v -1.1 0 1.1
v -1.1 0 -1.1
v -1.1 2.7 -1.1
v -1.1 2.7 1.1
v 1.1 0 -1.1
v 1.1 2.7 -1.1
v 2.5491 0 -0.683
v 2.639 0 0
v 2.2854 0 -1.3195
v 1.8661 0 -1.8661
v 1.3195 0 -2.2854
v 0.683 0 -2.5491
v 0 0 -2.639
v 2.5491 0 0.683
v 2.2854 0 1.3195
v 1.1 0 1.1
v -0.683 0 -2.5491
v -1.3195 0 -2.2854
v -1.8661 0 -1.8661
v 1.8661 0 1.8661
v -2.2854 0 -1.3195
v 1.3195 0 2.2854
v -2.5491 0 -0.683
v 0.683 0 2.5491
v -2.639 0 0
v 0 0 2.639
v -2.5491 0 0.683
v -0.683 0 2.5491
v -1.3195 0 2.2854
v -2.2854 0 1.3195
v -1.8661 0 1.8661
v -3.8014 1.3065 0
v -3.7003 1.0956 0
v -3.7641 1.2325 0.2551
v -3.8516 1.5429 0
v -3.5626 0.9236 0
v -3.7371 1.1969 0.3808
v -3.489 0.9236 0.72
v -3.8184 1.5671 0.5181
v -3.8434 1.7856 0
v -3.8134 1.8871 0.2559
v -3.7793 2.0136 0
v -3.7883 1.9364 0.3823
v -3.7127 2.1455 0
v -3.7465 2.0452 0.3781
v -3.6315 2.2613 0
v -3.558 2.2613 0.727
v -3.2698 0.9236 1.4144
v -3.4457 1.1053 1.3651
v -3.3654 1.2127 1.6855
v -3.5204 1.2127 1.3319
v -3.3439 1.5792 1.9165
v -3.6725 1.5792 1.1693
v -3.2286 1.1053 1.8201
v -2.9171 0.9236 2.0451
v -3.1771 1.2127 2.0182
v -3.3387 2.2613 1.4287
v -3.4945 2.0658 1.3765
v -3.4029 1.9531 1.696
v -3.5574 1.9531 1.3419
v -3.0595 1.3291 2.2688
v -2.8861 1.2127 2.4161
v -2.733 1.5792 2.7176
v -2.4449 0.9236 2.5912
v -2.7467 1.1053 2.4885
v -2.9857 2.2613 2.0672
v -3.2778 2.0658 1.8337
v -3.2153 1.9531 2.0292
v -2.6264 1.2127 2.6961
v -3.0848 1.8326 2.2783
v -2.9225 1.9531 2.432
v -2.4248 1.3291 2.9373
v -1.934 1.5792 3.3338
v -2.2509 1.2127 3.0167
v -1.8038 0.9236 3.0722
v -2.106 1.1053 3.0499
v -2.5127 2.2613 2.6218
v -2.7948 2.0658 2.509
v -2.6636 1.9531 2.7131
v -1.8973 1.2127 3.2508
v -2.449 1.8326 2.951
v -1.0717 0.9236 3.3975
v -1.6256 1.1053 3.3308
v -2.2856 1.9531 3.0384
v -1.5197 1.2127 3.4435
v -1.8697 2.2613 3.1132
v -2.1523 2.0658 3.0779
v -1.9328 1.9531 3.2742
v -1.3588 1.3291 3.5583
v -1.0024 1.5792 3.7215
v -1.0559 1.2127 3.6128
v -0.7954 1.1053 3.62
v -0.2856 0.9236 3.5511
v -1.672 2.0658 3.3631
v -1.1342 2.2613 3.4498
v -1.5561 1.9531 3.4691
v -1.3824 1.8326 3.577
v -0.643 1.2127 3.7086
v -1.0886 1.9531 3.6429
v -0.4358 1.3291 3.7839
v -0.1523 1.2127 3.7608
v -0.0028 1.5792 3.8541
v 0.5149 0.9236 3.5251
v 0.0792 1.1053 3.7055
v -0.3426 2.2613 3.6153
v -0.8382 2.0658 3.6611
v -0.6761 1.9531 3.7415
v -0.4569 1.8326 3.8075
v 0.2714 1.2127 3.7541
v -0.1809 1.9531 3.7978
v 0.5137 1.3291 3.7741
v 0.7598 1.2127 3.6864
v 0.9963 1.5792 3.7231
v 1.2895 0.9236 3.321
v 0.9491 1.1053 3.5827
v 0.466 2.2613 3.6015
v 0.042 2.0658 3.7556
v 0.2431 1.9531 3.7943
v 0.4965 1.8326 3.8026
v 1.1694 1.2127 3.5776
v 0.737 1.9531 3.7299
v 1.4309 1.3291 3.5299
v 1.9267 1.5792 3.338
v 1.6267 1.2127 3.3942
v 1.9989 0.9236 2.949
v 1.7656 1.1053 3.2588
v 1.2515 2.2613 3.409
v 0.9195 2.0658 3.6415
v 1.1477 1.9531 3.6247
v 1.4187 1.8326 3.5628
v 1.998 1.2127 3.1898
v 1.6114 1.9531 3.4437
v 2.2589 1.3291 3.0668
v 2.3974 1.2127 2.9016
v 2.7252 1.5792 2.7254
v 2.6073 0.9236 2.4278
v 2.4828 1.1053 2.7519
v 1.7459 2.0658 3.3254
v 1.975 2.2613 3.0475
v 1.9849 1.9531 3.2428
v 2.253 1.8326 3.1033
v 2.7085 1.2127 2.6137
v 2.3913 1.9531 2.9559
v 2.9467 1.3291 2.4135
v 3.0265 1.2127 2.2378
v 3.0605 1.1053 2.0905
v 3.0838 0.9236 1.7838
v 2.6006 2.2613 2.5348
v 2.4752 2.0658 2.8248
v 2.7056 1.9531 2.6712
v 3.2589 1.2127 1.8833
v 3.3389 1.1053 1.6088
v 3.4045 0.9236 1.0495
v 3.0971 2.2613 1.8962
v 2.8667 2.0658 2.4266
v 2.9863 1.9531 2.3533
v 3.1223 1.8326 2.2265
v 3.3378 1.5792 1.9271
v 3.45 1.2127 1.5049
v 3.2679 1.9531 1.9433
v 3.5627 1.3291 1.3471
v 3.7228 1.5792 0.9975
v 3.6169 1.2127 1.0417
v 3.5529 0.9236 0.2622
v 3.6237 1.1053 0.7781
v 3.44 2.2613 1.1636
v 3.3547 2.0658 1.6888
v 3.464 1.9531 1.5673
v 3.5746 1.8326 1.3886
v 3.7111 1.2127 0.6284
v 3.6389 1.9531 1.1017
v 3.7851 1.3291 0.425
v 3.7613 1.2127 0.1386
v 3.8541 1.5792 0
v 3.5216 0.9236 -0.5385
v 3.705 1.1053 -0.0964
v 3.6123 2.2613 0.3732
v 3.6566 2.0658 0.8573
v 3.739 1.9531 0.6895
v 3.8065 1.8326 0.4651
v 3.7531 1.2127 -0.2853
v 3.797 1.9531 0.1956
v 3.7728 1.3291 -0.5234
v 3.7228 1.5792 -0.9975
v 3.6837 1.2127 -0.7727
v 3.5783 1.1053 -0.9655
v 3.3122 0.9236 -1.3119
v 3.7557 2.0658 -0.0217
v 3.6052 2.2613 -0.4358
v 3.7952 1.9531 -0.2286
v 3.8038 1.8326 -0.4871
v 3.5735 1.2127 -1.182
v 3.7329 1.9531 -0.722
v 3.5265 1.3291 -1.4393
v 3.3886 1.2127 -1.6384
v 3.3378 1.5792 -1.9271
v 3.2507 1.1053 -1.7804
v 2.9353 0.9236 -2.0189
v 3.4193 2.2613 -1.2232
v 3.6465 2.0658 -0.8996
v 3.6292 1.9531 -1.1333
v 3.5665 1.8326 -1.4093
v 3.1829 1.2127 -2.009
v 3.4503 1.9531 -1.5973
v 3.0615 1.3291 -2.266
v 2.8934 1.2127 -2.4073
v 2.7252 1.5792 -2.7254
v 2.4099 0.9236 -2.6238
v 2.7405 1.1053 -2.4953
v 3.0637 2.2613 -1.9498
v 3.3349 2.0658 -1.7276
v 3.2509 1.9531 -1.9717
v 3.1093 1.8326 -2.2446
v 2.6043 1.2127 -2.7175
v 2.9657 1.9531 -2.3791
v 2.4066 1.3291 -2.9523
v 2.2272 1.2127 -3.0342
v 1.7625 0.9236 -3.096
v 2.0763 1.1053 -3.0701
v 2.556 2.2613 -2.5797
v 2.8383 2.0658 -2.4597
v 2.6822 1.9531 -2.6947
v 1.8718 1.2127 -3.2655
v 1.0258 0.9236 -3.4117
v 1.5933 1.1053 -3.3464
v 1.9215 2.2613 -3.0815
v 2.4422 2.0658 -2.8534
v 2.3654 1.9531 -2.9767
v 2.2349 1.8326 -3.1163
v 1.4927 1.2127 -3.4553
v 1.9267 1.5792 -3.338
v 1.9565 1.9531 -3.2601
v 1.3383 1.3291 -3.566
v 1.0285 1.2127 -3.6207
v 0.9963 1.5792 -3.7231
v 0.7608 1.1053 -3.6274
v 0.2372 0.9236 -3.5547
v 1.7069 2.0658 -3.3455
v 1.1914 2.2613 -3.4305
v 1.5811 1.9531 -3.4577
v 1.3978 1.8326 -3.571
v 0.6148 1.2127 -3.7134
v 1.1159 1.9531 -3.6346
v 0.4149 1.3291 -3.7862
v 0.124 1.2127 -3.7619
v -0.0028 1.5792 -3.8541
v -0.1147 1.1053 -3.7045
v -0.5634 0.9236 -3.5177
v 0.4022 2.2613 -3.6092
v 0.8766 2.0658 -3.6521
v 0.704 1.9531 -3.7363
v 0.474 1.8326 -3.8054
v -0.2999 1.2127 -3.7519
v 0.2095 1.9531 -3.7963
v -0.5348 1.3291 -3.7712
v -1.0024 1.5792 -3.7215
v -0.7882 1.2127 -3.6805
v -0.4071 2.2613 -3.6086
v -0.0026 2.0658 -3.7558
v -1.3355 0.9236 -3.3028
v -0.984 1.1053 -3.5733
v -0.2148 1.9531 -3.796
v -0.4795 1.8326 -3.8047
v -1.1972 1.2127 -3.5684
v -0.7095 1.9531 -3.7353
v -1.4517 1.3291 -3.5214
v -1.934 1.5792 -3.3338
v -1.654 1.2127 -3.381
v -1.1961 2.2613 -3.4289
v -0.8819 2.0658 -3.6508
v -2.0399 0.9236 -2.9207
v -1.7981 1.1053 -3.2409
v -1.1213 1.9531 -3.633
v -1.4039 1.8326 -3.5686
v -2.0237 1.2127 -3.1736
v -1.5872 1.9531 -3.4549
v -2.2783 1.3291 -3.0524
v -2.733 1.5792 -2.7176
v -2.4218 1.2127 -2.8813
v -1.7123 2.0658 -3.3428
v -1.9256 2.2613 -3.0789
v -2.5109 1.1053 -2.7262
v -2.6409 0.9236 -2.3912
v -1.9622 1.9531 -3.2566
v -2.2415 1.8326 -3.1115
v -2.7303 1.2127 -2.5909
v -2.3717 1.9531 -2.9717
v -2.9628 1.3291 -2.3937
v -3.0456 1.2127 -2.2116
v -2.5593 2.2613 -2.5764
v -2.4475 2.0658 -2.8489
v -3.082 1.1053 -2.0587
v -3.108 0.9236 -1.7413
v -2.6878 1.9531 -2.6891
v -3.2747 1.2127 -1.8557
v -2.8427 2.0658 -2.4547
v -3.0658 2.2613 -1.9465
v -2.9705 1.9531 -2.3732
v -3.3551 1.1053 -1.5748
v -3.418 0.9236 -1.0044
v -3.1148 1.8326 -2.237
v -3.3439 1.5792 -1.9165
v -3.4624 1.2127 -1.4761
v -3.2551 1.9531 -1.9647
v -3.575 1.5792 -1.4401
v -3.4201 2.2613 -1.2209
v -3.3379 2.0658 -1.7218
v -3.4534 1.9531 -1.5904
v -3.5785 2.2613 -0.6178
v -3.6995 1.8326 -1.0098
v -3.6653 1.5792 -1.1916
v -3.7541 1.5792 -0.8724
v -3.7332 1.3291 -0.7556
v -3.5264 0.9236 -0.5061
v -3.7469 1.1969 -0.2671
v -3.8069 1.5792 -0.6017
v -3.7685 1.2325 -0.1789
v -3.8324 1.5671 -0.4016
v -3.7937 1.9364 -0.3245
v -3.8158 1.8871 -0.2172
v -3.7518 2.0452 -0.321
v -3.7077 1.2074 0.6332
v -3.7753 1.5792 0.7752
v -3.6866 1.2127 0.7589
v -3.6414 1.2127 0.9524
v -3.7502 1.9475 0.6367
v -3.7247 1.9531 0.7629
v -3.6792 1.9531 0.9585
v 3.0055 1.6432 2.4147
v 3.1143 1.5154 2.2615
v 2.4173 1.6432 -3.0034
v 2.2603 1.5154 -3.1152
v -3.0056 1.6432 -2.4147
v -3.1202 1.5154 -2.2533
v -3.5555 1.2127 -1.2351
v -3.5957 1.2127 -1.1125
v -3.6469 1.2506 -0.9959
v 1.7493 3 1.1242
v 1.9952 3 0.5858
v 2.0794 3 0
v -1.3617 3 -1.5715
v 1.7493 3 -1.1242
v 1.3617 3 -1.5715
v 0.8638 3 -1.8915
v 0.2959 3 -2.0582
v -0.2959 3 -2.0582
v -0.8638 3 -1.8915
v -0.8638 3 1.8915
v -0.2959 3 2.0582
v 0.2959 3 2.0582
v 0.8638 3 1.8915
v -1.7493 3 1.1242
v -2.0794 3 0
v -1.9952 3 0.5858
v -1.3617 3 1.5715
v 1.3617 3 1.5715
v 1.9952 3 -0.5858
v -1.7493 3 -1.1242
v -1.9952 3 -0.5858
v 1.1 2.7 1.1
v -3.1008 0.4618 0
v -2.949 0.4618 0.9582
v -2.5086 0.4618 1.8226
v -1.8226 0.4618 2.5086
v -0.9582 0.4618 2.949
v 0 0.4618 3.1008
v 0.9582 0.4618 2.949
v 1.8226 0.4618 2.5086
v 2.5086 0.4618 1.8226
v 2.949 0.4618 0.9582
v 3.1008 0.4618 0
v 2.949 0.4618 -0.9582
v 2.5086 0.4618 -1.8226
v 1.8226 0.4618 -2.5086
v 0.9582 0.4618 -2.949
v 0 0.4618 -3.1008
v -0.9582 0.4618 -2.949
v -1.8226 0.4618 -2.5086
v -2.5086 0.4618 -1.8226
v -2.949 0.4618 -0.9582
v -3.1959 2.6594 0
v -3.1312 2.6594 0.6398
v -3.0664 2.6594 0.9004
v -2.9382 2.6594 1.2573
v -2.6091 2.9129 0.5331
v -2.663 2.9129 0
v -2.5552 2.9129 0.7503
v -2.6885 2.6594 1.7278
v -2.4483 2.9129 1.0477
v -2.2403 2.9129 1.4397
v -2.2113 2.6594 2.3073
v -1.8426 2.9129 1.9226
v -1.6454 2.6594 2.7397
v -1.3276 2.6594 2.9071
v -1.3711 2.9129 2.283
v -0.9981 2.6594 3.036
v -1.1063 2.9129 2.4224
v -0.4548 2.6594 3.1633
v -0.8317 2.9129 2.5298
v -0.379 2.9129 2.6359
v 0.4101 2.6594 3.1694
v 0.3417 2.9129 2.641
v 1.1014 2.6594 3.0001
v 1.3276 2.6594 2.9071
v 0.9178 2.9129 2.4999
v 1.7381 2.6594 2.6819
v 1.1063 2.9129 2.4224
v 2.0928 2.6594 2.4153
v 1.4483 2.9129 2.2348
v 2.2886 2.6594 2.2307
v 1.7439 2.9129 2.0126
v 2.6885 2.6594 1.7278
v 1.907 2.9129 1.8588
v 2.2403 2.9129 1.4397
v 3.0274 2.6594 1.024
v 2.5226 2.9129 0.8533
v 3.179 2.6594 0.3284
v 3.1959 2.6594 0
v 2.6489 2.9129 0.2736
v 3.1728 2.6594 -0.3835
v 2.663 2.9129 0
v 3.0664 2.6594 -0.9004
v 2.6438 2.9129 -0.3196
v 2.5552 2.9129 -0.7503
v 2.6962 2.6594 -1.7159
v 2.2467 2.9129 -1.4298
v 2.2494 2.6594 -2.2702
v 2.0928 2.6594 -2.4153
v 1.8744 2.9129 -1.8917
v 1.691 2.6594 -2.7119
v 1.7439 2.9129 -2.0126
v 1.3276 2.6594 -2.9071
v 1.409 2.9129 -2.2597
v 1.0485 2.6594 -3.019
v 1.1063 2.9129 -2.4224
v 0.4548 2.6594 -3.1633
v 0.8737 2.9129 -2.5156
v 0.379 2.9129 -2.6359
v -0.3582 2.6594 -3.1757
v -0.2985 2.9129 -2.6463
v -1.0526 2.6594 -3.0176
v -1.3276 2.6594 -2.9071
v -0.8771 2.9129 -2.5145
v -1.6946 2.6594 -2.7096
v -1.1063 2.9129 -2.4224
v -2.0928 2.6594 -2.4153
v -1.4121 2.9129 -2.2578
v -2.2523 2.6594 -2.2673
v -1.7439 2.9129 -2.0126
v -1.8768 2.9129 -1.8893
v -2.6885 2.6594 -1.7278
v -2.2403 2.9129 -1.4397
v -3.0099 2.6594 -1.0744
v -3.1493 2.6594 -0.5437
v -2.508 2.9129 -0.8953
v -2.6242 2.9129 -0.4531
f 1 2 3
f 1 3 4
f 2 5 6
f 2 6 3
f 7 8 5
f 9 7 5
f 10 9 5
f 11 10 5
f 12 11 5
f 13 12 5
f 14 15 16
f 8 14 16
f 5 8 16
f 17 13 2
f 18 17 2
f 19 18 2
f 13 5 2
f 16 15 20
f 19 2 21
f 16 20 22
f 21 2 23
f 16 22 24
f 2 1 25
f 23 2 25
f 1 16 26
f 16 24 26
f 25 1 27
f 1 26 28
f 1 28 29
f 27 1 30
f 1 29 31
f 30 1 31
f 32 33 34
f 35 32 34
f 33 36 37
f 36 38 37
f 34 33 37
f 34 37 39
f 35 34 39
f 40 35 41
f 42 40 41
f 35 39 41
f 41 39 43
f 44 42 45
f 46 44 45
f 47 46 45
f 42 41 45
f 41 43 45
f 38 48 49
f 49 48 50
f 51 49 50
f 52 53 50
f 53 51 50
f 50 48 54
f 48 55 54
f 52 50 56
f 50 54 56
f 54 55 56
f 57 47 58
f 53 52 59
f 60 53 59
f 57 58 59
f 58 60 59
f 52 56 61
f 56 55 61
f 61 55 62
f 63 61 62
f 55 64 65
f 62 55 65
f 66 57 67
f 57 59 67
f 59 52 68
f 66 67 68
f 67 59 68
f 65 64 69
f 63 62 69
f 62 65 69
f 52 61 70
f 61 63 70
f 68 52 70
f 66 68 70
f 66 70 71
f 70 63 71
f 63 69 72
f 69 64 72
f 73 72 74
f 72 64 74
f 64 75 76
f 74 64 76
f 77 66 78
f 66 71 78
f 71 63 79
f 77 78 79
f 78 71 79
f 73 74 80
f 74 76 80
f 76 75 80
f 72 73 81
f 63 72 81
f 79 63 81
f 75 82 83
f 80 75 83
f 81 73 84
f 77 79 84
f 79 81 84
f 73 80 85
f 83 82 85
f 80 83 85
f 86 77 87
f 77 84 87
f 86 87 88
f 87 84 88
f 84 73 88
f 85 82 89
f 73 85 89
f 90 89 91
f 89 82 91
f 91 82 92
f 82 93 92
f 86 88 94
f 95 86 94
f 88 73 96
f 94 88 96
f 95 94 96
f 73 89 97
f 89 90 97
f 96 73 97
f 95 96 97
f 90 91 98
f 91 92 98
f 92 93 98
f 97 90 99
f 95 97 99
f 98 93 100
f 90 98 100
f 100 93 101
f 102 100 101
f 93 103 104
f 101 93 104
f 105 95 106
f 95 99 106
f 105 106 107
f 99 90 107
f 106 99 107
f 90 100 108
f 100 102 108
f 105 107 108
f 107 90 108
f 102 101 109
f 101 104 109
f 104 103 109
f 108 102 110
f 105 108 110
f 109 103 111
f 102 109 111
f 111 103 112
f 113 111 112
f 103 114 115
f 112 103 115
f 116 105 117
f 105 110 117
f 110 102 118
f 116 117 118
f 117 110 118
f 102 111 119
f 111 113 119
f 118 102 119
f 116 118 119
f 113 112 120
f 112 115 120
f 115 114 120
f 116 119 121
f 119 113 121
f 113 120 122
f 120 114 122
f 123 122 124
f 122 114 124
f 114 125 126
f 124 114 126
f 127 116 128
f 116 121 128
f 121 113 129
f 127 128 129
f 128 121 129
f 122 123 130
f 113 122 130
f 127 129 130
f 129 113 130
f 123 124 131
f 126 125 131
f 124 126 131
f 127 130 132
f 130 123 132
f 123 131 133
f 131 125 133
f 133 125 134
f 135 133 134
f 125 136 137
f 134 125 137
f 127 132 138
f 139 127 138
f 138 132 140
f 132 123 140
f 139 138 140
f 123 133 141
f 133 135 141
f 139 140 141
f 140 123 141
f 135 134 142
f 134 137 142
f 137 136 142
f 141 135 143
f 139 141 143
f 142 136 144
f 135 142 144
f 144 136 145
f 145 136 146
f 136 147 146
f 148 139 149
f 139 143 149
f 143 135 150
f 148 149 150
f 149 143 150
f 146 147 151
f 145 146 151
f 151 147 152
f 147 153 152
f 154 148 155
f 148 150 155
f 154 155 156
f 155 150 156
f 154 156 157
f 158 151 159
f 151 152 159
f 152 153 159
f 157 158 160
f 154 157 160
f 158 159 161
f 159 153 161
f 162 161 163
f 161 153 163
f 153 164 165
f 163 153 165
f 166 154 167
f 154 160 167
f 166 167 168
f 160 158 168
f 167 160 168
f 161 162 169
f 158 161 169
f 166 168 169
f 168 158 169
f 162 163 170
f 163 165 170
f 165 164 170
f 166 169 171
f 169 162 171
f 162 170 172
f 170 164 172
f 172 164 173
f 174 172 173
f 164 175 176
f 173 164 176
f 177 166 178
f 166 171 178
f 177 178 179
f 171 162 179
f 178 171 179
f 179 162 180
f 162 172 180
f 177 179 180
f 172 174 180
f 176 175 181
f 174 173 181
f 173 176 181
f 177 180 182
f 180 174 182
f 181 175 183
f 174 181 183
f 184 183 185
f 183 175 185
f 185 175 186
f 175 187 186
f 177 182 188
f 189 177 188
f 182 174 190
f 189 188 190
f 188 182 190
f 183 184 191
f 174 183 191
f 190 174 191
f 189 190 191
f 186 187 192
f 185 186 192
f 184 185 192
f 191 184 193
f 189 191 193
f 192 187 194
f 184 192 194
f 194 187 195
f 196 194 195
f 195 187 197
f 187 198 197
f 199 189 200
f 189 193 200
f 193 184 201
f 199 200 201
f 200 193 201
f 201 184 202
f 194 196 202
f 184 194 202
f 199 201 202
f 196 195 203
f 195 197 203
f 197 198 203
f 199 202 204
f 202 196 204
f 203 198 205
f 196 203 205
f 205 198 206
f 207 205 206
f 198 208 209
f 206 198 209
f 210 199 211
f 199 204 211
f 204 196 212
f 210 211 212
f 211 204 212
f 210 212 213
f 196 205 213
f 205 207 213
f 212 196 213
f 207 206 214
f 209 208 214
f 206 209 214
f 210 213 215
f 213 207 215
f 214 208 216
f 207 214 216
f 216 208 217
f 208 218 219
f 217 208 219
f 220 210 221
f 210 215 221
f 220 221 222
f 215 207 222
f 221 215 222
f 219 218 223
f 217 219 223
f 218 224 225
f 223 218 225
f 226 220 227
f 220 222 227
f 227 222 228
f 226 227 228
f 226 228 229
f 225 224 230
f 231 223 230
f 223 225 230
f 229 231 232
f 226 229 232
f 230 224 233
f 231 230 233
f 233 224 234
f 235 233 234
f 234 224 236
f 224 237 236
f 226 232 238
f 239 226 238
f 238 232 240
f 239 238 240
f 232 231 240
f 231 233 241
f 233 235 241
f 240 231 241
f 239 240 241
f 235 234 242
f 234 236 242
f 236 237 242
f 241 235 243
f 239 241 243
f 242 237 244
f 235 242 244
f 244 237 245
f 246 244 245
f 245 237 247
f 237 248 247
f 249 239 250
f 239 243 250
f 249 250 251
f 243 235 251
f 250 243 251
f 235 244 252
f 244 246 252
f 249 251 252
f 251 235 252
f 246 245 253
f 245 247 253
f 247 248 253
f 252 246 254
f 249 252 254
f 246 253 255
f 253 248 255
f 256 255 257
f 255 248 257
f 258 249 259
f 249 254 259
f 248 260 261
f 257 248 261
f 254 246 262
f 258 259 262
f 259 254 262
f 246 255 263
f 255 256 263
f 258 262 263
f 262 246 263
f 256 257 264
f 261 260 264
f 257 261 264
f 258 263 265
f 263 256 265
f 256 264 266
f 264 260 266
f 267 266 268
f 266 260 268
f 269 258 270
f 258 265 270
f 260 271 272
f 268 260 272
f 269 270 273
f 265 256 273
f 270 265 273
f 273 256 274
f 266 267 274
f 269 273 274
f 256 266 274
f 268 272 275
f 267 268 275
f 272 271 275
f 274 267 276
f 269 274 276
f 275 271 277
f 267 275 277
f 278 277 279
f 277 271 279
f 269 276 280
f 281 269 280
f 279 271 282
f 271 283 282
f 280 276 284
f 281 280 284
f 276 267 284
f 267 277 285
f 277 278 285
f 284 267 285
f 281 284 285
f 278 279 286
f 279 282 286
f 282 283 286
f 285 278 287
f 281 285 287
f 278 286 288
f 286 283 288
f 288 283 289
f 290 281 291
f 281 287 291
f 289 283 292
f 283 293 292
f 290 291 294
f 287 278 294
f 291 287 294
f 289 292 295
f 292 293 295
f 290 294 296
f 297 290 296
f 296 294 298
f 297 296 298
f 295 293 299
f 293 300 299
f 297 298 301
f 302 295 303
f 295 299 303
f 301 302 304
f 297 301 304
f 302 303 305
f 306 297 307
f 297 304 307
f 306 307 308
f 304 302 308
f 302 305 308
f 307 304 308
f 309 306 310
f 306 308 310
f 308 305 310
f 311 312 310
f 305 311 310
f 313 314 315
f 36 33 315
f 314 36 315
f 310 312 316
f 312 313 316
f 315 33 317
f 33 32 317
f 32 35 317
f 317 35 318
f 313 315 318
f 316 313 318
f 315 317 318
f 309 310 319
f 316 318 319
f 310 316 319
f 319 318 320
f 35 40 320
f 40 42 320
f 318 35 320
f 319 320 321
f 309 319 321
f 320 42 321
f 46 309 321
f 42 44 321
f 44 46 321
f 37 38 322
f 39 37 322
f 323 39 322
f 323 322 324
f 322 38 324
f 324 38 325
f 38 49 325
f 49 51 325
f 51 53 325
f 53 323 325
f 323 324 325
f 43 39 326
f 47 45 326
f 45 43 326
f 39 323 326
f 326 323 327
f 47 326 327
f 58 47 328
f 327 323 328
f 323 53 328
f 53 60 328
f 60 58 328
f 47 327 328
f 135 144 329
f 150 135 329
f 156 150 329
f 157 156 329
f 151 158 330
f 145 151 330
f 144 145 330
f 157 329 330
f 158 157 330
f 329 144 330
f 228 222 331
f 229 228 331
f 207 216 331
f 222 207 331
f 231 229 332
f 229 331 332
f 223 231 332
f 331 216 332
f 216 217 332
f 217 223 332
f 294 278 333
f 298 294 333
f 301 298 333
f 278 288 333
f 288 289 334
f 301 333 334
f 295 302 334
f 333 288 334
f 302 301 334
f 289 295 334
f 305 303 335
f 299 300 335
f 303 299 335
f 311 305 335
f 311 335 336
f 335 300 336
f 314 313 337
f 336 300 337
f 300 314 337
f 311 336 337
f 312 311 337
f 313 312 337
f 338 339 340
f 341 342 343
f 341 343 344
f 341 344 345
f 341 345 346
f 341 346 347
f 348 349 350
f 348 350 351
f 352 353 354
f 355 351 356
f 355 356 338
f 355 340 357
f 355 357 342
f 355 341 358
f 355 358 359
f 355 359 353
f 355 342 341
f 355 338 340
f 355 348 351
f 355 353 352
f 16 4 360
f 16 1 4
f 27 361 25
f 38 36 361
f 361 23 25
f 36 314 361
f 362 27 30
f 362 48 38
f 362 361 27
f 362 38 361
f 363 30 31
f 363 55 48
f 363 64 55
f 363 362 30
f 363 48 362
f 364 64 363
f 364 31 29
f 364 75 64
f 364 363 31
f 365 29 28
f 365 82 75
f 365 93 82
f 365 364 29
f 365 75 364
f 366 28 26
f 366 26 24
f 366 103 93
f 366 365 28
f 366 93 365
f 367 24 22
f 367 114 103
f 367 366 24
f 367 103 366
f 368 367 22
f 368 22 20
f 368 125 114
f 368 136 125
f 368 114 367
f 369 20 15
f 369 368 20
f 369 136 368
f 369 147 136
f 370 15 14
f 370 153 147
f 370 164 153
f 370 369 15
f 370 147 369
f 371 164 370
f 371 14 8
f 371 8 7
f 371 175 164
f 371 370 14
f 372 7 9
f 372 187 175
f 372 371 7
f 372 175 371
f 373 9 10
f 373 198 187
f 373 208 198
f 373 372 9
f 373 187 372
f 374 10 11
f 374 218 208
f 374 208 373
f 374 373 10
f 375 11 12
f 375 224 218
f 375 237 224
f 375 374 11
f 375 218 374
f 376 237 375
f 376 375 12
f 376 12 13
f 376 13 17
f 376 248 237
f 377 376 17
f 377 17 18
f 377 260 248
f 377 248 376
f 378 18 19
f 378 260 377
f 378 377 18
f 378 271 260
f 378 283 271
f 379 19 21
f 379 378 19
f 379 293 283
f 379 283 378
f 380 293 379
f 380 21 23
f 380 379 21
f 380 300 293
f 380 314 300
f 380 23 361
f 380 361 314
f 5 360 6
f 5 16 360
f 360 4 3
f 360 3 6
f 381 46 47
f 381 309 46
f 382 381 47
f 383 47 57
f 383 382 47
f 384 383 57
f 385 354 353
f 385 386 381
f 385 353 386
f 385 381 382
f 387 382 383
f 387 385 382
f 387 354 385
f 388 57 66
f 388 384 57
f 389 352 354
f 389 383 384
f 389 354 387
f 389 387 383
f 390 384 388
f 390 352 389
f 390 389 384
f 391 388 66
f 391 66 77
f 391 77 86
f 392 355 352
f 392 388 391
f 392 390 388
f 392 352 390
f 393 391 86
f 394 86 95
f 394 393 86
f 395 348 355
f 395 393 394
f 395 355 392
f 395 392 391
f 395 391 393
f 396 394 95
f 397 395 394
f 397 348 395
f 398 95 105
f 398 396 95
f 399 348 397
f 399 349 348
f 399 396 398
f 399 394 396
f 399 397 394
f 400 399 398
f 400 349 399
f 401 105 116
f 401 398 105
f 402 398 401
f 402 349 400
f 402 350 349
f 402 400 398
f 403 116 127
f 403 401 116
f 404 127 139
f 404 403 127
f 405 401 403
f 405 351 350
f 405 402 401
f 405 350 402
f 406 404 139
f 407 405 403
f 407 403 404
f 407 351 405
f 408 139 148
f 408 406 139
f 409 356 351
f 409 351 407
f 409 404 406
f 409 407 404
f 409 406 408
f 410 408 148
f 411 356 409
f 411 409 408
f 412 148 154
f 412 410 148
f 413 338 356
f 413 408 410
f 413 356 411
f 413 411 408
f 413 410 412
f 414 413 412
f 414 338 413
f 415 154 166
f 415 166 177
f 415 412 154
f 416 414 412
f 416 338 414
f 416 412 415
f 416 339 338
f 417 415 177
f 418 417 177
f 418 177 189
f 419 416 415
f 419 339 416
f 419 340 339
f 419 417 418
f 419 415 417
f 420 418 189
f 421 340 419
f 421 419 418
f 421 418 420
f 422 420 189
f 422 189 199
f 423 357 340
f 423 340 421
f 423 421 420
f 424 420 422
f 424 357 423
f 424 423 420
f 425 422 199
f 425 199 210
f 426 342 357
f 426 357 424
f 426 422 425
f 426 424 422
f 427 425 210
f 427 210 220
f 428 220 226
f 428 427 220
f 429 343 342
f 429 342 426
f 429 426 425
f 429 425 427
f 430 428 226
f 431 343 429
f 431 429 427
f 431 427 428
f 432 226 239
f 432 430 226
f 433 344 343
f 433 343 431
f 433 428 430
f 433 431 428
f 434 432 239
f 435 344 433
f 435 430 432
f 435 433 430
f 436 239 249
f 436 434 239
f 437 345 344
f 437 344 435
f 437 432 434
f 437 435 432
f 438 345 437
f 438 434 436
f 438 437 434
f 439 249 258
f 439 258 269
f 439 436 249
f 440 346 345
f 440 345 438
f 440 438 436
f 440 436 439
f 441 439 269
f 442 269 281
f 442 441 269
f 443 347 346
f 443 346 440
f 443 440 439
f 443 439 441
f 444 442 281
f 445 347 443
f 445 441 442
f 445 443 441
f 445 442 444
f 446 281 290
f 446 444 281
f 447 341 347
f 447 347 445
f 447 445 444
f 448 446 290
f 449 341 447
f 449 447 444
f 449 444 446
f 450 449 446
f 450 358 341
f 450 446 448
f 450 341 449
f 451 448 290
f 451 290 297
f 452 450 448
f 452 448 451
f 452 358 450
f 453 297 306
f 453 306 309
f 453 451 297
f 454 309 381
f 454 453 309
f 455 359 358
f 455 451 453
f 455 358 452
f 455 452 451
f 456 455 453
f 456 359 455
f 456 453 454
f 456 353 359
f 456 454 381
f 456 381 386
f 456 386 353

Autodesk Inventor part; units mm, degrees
ref_plane "YZ Plane" through (0, 0, 0) normal (1, 0, 0) x (0, 1, 0)
ref_plane "XZ Plane" through (0, 0, 0) normal (0, 1, 0) x (-1, 0, 0)
ref_plane "XY Plane" through (0, 0, 0) normal (0, 0, 1) x (1, 0, 0)
sketch "Skizze1" plane through (0, 0, 0) normal (0, 1, 0) x (-1, 0, 0)
  circle A0 centre (0, 0) radius 4.039
  line L0 (0, 0) -> (1, 0)
  line L1 (1, 0) -> (1, 1)
  line L2 (1, 1) -> (0, 1)
  line L3 (0, 1) -> (0, 0)
  line L4 (1, 1) -> (-1, 1)
  line L5 (-1, 1) -> (-1, -1)
  line L6 (-1, -1) -> (1, -1)
  line L7 (1, -1) -> (1, 1)
  dimension "d10" = 1
  dimension "d11" = 1
  dimension "d12" = 2
  dimension "d13" = 2
extrude "Extrusion1" add sketch "Skizze1" along normal blind 3 contours A0 | L3 L2 L1 L0 | L0 L7 L6 L5 L4 L3
sketch "Skizze2" plane through (0, 3, 0) normal (0, 1, 0) x (1, 0, 0)
  circle A0 centre (0, 0) radius 2
extrude "Extrusion2" add sketch "Skizze2" against normal blind 1
chamfer "Fase1" distance 1.4 angle 45 1 edges at (4.039, 0, 0)
sketch "Skizze3" plane through (0, 0, 0) normal (0, -1, 0) x (1, 0, 0)
  line L0 (0, 0) -> (1.1, 0)
  line L1 (1.1, 0) -> (1.1, -1.1)
  line L2 (1.1, -1.1) -> (0, -1.1)
  line L3 (0, -1.1) -> (0, 0)
  line L4 (1.1, -1.1) -> (-1.1, -1.1)
  line L5 (-1.1, -1.1) -> (-1.1, 1.1)
  line L6 (-1.1, 1.1) -> (1.1, 1.1)
  line L7 (1.1, 1.1) -> (1.1, -1.1)
  dimension "d14" = 1.1
  dimension "d15" = 1.1
  dimension "d16" = 2.2
  dimension "d17" = 2.2
extrude "Extrusion3" cut sketch "Skizze3" against normal blind 2.7
fillet "Rundung4" radius 2 1 edges at (4.039, 3, 0)
fillet "Rundung5" radius 1 1 edges at (4.039, 1.4, 0)
properties part number "joystick" material "Gummi, Silikon"
